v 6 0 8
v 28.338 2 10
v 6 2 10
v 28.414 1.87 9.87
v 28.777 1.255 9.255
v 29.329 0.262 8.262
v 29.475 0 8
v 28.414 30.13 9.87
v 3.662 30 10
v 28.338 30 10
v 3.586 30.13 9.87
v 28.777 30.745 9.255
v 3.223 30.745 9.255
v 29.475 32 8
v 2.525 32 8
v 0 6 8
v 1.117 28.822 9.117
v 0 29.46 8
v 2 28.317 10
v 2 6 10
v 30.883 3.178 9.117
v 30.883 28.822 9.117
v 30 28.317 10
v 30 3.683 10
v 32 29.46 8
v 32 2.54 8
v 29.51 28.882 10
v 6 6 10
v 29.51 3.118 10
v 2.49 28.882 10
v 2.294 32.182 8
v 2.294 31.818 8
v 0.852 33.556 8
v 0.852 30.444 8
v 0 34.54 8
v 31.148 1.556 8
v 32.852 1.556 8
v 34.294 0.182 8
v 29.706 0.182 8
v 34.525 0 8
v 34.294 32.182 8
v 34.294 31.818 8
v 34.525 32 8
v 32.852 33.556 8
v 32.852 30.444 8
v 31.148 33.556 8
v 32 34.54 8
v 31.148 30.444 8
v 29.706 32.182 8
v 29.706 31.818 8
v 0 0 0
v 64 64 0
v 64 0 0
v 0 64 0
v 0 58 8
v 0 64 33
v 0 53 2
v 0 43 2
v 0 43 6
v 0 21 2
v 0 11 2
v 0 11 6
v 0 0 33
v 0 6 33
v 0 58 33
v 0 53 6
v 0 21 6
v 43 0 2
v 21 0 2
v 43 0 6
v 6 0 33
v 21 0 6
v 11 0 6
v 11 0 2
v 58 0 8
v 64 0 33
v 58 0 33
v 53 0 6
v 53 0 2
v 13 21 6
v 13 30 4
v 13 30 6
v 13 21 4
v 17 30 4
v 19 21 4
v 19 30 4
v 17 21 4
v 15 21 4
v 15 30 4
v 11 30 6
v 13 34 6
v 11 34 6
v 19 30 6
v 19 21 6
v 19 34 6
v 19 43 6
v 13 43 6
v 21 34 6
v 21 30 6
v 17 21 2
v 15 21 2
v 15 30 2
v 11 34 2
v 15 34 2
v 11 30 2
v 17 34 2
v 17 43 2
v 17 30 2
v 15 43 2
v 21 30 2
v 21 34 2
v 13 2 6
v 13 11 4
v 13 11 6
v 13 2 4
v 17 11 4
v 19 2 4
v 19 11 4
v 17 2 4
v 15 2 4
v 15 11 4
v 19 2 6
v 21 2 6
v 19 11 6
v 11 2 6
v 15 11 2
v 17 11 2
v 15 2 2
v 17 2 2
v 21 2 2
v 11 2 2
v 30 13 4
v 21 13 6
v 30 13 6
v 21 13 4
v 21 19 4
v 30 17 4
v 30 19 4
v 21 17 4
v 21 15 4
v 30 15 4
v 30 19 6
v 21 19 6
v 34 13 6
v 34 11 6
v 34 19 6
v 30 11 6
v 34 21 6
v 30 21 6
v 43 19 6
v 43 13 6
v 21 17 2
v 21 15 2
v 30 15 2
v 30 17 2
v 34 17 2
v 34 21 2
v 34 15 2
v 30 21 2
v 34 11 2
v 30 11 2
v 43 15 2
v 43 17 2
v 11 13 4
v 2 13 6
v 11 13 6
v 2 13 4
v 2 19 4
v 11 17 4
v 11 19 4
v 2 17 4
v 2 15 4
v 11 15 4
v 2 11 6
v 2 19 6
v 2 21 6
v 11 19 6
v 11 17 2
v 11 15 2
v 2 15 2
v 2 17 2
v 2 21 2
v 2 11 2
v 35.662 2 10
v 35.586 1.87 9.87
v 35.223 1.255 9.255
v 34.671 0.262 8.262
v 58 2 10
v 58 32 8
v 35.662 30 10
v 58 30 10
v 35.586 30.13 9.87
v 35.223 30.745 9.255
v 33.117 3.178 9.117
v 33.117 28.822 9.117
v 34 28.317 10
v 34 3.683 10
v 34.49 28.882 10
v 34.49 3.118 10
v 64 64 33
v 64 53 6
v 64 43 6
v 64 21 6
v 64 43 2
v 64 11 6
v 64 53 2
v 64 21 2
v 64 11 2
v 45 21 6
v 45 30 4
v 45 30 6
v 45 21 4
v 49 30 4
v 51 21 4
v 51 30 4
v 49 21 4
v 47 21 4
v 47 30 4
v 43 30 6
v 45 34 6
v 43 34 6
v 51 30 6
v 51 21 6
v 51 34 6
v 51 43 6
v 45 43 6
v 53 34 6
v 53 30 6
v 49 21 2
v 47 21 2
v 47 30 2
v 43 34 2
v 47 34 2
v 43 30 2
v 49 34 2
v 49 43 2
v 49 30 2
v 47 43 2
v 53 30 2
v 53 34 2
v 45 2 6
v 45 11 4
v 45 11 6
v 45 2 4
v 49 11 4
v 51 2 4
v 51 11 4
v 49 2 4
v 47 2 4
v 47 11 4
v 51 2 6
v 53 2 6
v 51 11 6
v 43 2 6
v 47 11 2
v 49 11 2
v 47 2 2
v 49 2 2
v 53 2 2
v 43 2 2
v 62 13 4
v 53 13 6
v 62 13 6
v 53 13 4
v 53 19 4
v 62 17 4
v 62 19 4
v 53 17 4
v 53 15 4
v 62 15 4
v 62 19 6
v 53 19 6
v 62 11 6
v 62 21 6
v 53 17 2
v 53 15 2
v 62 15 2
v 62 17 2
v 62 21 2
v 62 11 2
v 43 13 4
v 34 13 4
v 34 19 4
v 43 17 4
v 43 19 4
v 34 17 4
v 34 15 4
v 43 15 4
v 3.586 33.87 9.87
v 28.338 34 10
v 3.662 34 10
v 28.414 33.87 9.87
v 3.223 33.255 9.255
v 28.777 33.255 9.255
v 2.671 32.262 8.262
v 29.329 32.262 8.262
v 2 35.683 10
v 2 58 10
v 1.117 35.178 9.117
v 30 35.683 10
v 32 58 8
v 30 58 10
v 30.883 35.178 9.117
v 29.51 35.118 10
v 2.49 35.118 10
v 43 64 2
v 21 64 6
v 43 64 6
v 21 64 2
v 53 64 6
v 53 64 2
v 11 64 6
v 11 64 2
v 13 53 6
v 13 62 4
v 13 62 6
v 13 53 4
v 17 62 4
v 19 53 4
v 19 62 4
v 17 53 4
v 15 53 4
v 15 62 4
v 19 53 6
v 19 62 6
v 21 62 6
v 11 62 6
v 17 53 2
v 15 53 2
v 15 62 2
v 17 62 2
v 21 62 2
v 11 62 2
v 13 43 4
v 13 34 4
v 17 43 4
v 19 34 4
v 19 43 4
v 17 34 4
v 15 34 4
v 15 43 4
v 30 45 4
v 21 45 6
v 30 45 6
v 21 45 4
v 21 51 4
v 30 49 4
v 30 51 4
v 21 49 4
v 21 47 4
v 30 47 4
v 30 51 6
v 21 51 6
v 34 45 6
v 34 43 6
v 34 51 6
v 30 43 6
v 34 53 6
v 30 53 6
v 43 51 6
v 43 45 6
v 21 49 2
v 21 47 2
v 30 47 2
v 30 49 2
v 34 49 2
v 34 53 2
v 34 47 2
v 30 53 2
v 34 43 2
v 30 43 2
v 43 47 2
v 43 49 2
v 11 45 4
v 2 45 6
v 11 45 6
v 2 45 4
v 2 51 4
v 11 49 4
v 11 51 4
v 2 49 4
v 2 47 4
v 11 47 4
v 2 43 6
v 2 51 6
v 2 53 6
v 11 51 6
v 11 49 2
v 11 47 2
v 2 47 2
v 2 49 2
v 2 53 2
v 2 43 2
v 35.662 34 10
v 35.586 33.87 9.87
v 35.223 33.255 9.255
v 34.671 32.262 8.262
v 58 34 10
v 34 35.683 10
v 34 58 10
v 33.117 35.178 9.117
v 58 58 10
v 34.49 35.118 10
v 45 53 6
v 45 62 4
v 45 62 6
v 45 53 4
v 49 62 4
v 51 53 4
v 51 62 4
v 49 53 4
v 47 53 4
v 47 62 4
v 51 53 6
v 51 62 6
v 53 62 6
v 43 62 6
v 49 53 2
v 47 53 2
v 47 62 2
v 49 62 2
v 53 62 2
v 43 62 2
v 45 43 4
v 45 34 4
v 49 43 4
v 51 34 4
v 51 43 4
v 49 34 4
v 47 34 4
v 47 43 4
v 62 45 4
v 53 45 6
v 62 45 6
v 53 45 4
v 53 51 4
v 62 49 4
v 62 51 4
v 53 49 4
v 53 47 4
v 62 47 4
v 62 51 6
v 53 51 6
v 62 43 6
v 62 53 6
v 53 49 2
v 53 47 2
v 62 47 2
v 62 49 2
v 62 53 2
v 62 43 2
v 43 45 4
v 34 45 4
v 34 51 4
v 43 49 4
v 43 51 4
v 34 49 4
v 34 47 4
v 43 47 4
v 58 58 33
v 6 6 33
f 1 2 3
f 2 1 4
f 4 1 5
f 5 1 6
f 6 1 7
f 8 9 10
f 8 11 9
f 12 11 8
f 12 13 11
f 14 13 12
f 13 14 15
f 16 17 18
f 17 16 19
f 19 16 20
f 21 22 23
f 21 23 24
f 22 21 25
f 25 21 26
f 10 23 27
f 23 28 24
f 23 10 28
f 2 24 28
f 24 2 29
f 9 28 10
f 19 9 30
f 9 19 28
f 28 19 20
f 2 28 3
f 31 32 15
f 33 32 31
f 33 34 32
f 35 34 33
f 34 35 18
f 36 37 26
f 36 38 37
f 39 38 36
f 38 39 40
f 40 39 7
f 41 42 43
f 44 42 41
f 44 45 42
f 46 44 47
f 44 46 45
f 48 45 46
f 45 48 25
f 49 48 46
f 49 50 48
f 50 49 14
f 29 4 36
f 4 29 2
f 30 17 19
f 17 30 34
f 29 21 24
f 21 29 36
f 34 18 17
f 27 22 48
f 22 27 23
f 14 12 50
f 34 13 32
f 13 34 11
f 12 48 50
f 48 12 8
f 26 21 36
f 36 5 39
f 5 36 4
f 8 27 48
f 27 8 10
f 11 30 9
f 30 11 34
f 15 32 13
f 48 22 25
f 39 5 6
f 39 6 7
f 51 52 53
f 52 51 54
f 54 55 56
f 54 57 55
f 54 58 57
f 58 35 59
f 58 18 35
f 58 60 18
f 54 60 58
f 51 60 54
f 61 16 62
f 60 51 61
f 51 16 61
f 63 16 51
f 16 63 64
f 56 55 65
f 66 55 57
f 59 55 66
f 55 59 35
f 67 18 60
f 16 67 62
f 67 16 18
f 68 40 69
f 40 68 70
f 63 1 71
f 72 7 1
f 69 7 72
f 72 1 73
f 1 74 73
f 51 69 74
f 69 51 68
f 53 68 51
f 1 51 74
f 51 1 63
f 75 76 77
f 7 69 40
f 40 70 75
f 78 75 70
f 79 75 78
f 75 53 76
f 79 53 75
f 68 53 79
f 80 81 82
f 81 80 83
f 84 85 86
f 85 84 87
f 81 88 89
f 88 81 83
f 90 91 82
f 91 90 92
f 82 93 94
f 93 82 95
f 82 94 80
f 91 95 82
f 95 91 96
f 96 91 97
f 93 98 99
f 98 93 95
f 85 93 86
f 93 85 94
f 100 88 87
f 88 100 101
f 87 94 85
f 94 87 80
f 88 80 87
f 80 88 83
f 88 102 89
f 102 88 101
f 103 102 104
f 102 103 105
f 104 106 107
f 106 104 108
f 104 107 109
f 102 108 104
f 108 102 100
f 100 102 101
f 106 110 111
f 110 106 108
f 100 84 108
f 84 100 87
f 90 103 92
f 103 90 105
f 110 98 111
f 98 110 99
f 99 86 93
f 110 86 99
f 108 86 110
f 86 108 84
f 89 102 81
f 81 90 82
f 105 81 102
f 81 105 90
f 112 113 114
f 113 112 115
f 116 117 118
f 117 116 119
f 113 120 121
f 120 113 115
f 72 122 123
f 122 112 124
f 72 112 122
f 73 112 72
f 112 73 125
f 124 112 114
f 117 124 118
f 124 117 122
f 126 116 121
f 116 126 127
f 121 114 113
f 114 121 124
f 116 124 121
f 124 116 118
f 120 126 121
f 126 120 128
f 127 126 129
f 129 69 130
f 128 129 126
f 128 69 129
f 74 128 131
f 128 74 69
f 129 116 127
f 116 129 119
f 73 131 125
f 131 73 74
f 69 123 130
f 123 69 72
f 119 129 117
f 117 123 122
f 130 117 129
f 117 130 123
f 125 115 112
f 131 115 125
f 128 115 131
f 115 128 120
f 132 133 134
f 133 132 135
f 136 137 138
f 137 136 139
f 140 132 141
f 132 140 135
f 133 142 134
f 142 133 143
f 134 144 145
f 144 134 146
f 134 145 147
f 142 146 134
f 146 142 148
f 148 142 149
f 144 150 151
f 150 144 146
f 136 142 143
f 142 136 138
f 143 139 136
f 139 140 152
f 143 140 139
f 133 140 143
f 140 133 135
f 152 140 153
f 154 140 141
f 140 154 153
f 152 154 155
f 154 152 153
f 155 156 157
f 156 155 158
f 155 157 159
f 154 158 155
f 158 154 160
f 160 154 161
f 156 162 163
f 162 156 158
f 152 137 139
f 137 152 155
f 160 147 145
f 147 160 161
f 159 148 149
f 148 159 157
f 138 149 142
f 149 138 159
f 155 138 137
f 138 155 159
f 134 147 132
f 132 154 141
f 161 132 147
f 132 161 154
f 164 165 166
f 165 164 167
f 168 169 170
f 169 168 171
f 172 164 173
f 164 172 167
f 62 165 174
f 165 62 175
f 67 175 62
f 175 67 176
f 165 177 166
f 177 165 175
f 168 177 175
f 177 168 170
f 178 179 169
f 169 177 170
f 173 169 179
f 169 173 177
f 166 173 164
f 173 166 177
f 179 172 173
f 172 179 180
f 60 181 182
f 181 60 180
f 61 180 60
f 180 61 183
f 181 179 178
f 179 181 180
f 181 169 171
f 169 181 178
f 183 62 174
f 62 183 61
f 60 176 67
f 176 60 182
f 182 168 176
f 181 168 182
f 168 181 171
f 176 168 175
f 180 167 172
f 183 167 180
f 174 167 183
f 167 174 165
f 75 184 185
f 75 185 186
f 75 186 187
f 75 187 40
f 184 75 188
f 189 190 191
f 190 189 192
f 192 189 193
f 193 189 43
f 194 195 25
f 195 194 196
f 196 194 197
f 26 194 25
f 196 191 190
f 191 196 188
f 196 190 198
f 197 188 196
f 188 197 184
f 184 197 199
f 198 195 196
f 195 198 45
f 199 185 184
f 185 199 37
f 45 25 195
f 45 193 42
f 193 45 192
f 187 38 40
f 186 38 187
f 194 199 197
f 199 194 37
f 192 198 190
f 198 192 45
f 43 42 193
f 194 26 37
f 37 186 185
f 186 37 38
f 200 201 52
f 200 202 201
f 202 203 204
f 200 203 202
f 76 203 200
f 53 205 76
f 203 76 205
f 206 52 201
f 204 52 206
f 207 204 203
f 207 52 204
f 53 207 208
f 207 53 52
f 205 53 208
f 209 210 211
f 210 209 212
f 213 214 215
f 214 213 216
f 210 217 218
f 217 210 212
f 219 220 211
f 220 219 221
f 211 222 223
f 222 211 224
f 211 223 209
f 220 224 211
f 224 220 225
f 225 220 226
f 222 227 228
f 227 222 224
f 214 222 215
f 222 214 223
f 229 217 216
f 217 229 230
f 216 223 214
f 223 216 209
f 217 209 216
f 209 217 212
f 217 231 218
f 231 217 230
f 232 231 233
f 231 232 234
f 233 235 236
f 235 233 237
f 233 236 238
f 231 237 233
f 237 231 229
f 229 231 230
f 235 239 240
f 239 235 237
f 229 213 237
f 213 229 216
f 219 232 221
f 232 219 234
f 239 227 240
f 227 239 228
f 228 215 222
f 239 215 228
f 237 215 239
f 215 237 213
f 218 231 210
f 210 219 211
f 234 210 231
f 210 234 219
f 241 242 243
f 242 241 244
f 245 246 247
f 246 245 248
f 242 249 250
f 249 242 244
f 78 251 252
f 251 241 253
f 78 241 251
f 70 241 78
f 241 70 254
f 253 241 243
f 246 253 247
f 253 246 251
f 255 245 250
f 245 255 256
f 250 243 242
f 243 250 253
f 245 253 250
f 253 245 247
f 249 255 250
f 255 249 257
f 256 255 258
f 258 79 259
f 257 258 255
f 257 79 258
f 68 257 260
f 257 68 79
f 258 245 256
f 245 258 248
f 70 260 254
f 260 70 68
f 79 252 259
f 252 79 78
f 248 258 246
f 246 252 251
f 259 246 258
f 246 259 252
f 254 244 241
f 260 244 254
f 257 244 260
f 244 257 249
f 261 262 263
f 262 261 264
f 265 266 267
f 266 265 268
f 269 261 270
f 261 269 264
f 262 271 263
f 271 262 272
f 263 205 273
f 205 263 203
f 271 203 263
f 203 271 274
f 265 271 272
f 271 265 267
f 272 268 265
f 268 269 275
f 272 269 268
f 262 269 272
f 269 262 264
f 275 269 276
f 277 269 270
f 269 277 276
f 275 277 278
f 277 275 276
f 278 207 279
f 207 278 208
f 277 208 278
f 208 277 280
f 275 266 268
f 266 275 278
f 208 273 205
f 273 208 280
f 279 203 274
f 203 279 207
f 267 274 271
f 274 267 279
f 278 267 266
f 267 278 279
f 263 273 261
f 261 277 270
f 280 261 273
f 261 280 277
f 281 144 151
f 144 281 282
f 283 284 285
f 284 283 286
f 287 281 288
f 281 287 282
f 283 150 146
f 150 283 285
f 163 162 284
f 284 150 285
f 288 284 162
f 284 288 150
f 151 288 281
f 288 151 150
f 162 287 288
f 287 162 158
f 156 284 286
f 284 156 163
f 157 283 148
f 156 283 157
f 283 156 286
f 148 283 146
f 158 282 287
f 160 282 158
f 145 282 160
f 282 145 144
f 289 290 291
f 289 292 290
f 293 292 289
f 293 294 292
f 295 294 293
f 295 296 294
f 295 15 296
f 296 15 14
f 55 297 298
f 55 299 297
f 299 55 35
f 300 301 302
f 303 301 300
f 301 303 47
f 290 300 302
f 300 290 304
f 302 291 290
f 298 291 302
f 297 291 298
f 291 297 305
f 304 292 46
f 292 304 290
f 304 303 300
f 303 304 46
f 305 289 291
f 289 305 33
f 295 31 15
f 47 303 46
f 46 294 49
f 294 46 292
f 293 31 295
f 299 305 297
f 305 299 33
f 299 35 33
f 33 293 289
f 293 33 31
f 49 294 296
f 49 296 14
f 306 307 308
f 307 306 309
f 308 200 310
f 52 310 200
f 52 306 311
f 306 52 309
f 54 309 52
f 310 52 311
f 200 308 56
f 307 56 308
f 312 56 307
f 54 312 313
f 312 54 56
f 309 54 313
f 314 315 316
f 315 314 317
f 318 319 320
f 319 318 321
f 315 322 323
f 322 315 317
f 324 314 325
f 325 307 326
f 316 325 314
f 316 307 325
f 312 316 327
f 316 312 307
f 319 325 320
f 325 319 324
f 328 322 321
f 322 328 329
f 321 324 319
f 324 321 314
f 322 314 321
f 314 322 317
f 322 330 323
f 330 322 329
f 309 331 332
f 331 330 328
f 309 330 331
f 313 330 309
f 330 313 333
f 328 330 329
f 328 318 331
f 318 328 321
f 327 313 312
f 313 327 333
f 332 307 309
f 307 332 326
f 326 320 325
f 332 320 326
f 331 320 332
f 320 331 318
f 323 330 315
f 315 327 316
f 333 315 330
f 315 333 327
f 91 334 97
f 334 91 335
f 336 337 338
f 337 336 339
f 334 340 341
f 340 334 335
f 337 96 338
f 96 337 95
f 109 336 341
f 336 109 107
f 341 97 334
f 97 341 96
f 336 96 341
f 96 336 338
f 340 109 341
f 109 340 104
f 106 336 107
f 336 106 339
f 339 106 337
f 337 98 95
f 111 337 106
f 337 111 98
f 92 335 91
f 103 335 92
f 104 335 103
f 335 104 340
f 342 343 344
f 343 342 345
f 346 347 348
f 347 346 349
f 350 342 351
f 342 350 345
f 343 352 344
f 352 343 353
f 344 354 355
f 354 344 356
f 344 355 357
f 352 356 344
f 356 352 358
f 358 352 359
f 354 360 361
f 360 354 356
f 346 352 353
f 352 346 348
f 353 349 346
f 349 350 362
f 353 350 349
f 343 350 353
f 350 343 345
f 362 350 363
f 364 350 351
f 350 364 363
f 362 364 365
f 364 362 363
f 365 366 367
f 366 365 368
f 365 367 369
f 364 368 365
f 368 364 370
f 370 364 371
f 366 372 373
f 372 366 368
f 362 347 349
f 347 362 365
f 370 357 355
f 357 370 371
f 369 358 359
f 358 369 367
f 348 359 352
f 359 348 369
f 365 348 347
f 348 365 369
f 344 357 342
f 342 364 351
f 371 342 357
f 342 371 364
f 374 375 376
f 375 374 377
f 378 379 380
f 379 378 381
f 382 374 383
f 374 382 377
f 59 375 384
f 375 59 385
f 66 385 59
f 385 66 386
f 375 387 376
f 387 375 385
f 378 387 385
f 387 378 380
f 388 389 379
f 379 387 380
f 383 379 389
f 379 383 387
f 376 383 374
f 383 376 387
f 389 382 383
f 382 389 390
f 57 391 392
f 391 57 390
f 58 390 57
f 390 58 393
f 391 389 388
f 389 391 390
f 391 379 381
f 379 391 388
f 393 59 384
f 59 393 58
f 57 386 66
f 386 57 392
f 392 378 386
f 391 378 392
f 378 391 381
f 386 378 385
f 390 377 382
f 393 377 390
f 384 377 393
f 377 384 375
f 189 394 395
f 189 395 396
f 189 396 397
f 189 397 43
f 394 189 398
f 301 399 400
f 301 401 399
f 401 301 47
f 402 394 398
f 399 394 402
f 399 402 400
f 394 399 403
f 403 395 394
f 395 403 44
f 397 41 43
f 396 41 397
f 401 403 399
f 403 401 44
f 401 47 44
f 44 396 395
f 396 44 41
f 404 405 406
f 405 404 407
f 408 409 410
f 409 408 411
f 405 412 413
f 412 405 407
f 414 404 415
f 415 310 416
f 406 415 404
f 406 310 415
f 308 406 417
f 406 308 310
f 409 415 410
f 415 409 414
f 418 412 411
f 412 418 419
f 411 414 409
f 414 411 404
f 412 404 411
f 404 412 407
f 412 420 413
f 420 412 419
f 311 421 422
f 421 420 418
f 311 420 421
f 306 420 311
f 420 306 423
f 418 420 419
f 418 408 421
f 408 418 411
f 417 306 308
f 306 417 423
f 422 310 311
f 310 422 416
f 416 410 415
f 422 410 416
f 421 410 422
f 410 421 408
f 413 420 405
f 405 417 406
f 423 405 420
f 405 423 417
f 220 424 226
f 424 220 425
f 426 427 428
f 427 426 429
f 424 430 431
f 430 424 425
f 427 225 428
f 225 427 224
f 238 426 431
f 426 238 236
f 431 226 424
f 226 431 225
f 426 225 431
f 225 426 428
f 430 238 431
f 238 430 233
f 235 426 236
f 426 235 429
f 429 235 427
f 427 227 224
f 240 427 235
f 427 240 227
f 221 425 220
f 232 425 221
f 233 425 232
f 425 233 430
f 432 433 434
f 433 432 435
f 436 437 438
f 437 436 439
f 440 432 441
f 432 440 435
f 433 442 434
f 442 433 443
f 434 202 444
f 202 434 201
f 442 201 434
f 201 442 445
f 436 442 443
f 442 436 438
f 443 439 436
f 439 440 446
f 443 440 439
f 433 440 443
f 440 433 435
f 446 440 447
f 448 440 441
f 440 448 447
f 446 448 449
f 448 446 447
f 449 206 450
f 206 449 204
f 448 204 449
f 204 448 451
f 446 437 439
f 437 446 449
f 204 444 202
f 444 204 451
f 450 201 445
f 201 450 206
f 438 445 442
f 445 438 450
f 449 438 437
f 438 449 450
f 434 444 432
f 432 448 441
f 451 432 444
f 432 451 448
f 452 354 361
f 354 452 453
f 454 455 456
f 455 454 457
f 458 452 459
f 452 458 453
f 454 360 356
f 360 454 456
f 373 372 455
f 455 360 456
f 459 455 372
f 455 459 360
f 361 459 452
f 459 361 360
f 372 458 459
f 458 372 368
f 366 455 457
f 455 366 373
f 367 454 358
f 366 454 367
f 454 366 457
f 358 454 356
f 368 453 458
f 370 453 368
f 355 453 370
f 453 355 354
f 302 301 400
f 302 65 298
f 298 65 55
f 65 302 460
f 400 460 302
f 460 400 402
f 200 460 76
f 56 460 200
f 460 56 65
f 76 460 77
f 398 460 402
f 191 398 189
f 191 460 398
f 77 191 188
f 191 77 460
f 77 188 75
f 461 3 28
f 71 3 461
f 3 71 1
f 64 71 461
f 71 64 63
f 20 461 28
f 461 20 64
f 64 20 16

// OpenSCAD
// file: ModularDungeonTileLibrary.scad
//Constants
wallleft = 0;
wallbottom = 1;
wallright = 2;
walltop = 3;
wallcenter = 4;
walldoubleright = 5;


//Variables
size = 32;
connectorlength = size-10;
connectorwidth = 6;
connectorheight = 4;
baseheight = 8;
topperheight = 2;
topperrounded = true;
walllength = size;
wallheight = 25;
wallwidth = 6;
wallwidththin = 4;


//Functions
function hypotenuse_ra(side_a, side_b) =
    sqrt(pow(side_a, 2) + pow(side_b, 2));
    
    
//Modules    
module mtdl_Base_Connector(cw,cl,ch) {
    translate([-connectorwidth/2,-connectorlength/2,-connectorheight/2]) {
        cube([cw,cl,ch/2]);
        translate([cw/3,0,ch/2])
            cube([cw/3,cl,ch/2]);
        translate([-(cw-2)/2,cl/2-2,0])
            cube([cw+4,4,ch]);
    }
}

module mdtl_Base(s,bh)
{
    cube([s,s,bh]);
}

module mdtl_Topper(s,bh,th,tr)
{
    if (tr) {
        translate([0,0,bh])
            intersection() {
                difference () {
                        cube([s,s,th]);
                        union () {
                        rotate(a=45, v=[1,0,0])
                            cube([s,th*2,th*2]);
                        translate([0,s,0])
                            rotate(a=45, v=[1,0,0])
                                cube([s,th*2,th*2]);
                        rotate(a=-45, v=[0,1,0])
                            cube([th*2,s,th*2]);
                        translate([s,0,0])
                            rotate(a=-45, v=[0,1,0])
                                cube([th*2,s,th*2]);
                        }
                }
                translate([s/2,s/2,0])
                    cylinder(
                        h=th, 
                        r1=hypotenuse_ra(s/2-1.2, s/2-1.2), 
                        r2=hypotenuse_ra(s/2-th-.8, s/2-th-.8), 
                        center=false, 
                        $fa=.1);
            }    
    }
    else {
        translate([0,0,bh])
            difference() {
                cube([s,s,th]);
                union () {
                rotate(a=45, v=[1,0,0])
                    cube([s,th*2,th*2]);
                translate([0,s,0])
                    rotate(a=45, v=[1,0,0])
                        cube([s,th*2,th*2]);
                rotate(a=-45, v=[0,1,0])
                    cube([th*2,s,th*2]);
                translate([s,0,0])
                    rotate(a=-45, v=[0,1,0])
                        cube([th*2,s,th*2]);
                }
            }    
    }
}

module mdtl_Base_1x1(s,bh,th,tr) 
{
    difference () {
        union () {
            mdtl_Base(s,bh);
            mdtl_Topper(s,bh,th,tr);
        }
        union () {
            translate([size/2,size,baseheight/2])
                rotate([0,180,0])
                    mtdl_Base_Connector(connectorwidth,connectorlength,connectorheight);
            translate([size/2,0,baseheight/2])
                rotate([0,180,0])
                    mtdl_Base_Connector(connectorwidth,connectorlength,connectorheight);
            translate([size,size/2,baseheight/2])
                rotate([0,180,90])
                    mtdl_Base_Connector(connectorwidth,connectorlength,connectorheight);
            translate([0,size/2,baseheight/2])
                rotate([0,180,90])
                    mtdl_Base_Connector(connectorwidth,connectorlength,connectorheight);
        }
    }
}

module mdtl_Base_1x2(s,bh,th,tr)
{
    union () {
        mdtl_Base_1x1(s,bh,th,tr);
        translate([s,0,0])
            mdtl_Base_1x1(s,bh,th,tr);
    }
}
 
module mdtl_Base_2x2(s,bh,th,tr)
{
    union () {
        mdtl_Base_1x2(s,bh,th,tr);
        translate([0,s,0])
            mdtl_Base_1x2(s,bh,th,tr);
    }
}
 
module mdtl_Base_2x4(s,bh,th,tr)
{
    union () {
        mdtl_Base_2x2(s,bh,th,tr);
        translate([s*2,0,0])
            mdtl_Base_2x2(s,bh,th,tr);
    }
}
 
module mdtl_Base_4x4(s,bh,th,tr)
{
    union () {
        mdtl_Base_2x4(s,bh,th,tr);
        translate([0,s*2,0])
            mdtl_Base_2x4(s,bh,th,tr);
    }
}
 
module mdtl_Wall_1(w,l,h)
{
    translate([0,0,baseheight])
        cube([w,l,h]);   
}

module mdtl_Wall_1_Position(w,l,h,p)
{
    if (p==0) {
        mdtl_Wall_1(w,l,h);
    }
    
    else if (p==1) {
        rotate(a=-90)
           translate([-w,0,0])
               mdtl_Wall_1(w,l,h);       
    }
    
    else if (p==2) {
        translate([(size)-w,0,0])
            mdtl_Wall_1(w,l,h);
    }
    
    else if (p==3) {
        rotate(a=-90)
            translate([-l,0,0])
                mdtl_Wall_1(w,l,h);
    }
    
    else if (p==4) {
        translate([(size)-w/2,0,0])
            mdtl_Wall_1(w,l,h);
    }
    
    else if (p==5) {
        translate([(size*2)-w,0,0])
           mdtl_Wall_1(w,l,h);       
    }
}

module mdtl_Wall_2(w,l,h)
{
    union() {
        mdtl_Wall_1(w,l,h);
        translate([0,l,0])
            mdtl_Wall_1(w,l,h);
    }
}

module mdtl_Wall_2_Position(w,l,h,p)
{
    if (p==0) {
        mdtl_Wall_2(w,l,h);
    }
    
    else if (p==1) {
        rotate(a=-90)
            translate([-w,0,0])
                mdtl_Wall_2(w,l,h);
    }
    
    else if (p==2) {
    translate([(size*2)-w,0,0])
        mdtl_Wall_2(w,l,h);
    }
    
    else if (p==3) {
        rotate(a=-90)
            translate([-l*2,0,0])
                mdtl_Wall_2(w,l,h);
    }
    
    else if (p==4) {
        translate([(size)-w/2,0,0])
            mdtl_Wall_2(w,l,h);
    }
}
// main file
include <ModularDungeonTileLibrary.scad>; 

mdtl_Base_2x2(size,baseheight,topperheight,topperrounded);
mdtl_Wall_2_Position(wallwidth,walllength,wallheight,walltop);
mdtl_Wall_2_Position(wallwidth,walllength,wallheight,wallright);
//Create Pillar with Modified wall
mdtl_Wall_1_Position(wallwidth,wallwidth,wallheight,wallleft);
